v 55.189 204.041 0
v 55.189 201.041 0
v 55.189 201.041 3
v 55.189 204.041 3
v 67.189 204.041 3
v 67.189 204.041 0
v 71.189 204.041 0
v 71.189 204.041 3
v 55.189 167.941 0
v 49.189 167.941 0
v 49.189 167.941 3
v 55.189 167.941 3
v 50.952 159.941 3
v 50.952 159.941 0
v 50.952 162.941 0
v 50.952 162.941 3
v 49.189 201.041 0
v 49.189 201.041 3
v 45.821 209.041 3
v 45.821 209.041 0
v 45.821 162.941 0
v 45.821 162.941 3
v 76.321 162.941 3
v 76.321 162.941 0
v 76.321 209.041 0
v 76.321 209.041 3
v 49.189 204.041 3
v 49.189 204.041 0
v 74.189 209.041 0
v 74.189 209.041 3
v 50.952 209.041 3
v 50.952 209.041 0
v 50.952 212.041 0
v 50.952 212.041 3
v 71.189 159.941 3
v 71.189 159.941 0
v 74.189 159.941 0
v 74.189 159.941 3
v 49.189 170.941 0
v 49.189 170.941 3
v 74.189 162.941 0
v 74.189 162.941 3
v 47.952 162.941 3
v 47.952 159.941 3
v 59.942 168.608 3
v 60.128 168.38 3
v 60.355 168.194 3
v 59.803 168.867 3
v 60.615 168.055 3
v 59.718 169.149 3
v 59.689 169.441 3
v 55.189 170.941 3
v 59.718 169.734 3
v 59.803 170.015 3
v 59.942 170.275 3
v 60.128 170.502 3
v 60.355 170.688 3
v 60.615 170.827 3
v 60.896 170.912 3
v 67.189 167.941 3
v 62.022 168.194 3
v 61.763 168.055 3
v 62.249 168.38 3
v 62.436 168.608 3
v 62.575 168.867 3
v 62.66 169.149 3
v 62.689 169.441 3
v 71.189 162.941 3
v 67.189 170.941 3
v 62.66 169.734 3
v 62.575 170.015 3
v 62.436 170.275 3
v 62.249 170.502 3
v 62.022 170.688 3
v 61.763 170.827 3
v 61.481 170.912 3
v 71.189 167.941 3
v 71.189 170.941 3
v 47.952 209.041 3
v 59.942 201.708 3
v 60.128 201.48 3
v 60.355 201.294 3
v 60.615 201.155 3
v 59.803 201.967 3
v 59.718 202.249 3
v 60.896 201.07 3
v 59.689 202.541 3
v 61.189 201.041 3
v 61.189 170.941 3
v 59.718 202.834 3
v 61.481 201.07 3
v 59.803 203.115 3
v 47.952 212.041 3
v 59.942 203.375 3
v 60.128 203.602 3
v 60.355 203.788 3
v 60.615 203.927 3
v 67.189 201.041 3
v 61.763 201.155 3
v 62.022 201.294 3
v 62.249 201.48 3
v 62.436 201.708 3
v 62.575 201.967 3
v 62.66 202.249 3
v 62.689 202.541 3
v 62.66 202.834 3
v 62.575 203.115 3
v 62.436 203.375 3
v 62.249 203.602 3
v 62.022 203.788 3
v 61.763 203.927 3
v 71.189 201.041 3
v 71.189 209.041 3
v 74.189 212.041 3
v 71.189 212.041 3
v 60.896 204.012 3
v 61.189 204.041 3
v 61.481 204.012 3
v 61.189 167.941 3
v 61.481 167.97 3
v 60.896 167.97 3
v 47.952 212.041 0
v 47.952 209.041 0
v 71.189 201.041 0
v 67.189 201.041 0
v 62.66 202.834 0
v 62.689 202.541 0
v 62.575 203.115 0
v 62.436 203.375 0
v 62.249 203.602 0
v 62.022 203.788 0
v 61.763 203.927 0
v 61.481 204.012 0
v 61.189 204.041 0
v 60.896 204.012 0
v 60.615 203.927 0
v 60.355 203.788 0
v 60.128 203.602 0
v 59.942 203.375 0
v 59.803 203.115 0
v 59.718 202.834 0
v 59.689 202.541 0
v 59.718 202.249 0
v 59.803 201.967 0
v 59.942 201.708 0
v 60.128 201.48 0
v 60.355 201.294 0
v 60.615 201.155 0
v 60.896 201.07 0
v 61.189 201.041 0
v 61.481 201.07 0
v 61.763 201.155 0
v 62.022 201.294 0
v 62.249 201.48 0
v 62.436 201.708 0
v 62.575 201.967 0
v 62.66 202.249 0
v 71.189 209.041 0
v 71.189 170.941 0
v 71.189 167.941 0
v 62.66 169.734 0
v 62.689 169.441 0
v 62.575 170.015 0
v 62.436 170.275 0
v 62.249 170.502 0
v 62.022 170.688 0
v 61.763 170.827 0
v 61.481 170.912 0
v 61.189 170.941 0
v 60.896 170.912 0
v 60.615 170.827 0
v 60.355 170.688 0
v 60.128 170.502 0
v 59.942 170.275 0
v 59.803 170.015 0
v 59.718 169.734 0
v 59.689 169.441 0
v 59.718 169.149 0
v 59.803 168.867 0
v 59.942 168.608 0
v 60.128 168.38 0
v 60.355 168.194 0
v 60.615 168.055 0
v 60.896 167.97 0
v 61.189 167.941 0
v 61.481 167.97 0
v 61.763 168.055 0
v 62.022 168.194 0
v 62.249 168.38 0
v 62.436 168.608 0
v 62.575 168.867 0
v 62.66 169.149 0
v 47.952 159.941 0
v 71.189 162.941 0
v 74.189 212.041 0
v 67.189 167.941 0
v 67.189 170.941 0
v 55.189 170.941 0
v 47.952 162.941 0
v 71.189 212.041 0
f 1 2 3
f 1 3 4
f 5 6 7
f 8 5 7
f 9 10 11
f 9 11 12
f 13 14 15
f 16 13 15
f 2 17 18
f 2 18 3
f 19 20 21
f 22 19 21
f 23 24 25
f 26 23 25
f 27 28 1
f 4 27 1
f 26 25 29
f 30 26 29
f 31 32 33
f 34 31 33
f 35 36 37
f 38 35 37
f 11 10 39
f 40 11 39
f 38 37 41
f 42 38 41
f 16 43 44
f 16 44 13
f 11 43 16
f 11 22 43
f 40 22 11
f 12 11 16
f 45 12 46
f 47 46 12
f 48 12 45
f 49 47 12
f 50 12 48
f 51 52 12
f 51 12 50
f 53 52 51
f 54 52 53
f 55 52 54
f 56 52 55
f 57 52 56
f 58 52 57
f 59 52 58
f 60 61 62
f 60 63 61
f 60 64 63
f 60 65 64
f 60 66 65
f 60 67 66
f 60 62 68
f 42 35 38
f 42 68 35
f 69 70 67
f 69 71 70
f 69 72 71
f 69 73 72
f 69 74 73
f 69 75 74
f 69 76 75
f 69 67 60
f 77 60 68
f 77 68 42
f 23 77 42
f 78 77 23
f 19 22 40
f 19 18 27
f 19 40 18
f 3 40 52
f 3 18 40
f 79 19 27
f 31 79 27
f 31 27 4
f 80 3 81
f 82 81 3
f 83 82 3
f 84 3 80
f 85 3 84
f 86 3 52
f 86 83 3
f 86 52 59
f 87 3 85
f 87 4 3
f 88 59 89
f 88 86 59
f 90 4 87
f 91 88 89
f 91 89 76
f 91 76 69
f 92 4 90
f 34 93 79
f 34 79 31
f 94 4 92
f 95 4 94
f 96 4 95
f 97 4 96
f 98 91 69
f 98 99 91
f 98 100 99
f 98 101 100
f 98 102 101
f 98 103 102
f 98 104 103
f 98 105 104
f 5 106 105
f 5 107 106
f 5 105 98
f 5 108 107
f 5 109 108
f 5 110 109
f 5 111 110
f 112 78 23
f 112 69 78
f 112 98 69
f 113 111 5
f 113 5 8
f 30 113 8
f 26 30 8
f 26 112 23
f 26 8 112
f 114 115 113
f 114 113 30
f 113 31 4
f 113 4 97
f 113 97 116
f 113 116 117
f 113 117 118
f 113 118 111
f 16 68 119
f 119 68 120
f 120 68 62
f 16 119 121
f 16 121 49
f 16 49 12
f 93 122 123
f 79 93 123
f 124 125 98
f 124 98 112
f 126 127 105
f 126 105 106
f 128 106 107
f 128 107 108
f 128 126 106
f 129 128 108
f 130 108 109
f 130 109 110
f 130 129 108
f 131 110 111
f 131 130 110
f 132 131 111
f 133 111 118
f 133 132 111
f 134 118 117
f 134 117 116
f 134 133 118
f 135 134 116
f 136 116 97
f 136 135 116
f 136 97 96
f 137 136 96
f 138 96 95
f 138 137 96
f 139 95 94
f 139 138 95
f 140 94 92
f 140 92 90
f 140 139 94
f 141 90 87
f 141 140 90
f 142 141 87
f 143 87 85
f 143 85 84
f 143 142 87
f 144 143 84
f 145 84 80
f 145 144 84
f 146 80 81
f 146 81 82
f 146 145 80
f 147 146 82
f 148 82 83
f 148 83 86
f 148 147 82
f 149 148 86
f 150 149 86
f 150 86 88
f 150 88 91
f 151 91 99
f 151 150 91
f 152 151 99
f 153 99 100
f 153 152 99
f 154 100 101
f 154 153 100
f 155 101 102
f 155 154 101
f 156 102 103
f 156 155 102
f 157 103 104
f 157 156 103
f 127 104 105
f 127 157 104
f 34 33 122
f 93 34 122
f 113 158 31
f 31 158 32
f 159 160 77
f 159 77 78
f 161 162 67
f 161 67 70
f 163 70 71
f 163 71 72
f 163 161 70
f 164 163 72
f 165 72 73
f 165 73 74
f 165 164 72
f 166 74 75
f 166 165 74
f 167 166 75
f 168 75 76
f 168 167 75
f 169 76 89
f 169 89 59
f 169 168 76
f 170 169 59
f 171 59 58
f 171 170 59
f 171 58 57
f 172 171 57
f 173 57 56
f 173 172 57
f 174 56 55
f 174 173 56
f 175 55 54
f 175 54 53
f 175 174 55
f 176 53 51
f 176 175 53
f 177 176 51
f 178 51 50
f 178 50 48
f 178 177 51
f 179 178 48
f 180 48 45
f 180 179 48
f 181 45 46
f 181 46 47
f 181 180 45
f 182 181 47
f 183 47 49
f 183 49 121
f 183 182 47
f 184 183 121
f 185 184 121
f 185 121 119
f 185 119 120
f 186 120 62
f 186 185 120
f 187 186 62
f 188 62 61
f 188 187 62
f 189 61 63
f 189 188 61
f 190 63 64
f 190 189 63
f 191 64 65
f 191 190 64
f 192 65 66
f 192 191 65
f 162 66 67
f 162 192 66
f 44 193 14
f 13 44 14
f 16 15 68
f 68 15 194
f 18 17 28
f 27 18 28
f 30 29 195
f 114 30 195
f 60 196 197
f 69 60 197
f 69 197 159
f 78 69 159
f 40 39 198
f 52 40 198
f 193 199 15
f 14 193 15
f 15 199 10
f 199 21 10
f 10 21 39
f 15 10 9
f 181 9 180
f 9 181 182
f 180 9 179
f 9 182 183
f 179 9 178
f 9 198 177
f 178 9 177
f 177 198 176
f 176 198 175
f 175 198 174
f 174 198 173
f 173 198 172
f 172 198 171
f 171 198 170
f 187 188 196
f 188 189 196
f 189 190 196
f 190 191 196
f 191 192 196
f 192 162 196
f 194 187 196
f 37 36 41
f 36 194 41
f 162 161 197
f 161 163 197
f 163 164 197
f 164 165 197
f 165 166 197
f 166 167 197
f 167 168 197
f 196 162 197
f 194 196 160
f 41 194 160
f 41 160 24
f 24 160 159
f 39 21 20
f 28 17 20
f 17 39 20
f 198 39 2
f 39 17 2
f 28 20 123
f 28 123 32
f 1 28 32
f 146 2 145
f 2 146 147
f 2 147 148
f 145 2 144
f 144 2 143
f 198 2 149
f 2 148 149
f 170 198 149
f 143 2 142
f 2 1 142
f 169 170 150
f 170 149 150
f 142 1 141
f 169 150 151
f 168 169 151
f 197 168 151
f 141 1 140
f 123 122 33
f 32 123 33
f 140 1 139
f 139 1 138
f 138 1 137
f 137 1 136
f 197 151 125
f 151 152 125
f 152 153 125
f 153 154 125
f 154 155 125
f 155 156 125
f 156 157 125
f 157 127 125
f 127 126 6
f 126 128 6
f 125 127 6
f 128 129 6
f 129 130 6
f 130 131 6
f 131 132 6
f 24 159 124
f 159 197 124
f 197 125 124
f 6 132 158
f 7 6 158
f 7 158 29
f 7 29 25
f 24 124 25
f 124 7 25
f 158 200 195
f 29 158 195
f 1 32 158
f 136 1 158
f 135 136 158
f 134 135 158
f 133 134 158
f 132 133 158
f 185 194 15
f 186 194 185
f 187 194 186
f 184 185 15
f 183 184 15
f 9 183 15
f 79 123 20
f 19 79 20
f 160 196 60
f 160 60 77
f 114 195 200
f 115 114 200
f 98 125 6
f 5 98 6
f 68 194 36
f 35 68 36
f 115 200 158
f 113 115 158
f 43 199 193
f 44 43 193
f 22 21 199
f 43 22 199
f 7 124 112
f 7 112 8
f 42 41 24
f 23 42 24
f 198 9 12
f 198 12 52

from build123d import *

# Parameters (mm, degrees)
SKETCH1_R           = 1.5
SKETCH1_W           = 6
SKETCH1_H           = 3
SKETCH1_W_2         = 4
BOSS_EXTRUDE1_DEPTH = 3


with BuildPart() as part:
    # Sketch1 → Boss-Extrude1 (new body)
    with BuildSketch(Plane.XY):
        Polygon((71.188714063, 159.941147496), (74.188714063, 159.941147496), (74.188714063, 162.941147496), (76.320599063, 162.941147496), (76.320599063, 209.041147496), (74.188714063, 209.041147496), (74.188714063, 212.041147496), (71.188714063, 212.041147496), (71.188714063, 209.041147496), (50.952483563, 209.041147496), (50.952483563, 212.041147496), (47.952483563, 212.041147496), (47.952483563, 209.041147496), (45.820598563, 209.041147496), (45.820598563, 162.941147496), (47.952483563, 162.941147496), (47.952483563, 159.941147496), (50.952483563, 159.941147496), (50.952483563, 162.941147496), (71.188714063, 162.941147496), align=None)
        with Locations((61.188714063, 202.541147496)):
            Circle(SKETCH1_R, mode=Mode.SUBTRACT)
        with Locations((61.188714063, 169.441147496)):
            Circle(SKETCH1_R, mode=Mode.SUBTRACT)
        with Locations((52.188714063, 202.541147496)):
            Rectangle(SKETCH1_W, SKETCH1_H, mode=Mode.SUBTRACT)
        with Locations((69.188714063, 202.541147496)):
            Rectangle(SKETCH1_W_2, SKETCH1_H, mode=Mode.SUBTRACT)
        with Locations((52.188714063, 169.441147496)):
            Rectangle(SKETCH1_W, SKETCH1_H, mode=Mode.SUBTRACT)
        with Locations((69.188714063, 169.441147496)):
            Rectangle(SKETCH1_W_2, SKETCH1_H, mode=Mode.SUBTRACT)
    extrude(amount=BOSS_EXTRUDE1_DEPTH)


solid = part.part
